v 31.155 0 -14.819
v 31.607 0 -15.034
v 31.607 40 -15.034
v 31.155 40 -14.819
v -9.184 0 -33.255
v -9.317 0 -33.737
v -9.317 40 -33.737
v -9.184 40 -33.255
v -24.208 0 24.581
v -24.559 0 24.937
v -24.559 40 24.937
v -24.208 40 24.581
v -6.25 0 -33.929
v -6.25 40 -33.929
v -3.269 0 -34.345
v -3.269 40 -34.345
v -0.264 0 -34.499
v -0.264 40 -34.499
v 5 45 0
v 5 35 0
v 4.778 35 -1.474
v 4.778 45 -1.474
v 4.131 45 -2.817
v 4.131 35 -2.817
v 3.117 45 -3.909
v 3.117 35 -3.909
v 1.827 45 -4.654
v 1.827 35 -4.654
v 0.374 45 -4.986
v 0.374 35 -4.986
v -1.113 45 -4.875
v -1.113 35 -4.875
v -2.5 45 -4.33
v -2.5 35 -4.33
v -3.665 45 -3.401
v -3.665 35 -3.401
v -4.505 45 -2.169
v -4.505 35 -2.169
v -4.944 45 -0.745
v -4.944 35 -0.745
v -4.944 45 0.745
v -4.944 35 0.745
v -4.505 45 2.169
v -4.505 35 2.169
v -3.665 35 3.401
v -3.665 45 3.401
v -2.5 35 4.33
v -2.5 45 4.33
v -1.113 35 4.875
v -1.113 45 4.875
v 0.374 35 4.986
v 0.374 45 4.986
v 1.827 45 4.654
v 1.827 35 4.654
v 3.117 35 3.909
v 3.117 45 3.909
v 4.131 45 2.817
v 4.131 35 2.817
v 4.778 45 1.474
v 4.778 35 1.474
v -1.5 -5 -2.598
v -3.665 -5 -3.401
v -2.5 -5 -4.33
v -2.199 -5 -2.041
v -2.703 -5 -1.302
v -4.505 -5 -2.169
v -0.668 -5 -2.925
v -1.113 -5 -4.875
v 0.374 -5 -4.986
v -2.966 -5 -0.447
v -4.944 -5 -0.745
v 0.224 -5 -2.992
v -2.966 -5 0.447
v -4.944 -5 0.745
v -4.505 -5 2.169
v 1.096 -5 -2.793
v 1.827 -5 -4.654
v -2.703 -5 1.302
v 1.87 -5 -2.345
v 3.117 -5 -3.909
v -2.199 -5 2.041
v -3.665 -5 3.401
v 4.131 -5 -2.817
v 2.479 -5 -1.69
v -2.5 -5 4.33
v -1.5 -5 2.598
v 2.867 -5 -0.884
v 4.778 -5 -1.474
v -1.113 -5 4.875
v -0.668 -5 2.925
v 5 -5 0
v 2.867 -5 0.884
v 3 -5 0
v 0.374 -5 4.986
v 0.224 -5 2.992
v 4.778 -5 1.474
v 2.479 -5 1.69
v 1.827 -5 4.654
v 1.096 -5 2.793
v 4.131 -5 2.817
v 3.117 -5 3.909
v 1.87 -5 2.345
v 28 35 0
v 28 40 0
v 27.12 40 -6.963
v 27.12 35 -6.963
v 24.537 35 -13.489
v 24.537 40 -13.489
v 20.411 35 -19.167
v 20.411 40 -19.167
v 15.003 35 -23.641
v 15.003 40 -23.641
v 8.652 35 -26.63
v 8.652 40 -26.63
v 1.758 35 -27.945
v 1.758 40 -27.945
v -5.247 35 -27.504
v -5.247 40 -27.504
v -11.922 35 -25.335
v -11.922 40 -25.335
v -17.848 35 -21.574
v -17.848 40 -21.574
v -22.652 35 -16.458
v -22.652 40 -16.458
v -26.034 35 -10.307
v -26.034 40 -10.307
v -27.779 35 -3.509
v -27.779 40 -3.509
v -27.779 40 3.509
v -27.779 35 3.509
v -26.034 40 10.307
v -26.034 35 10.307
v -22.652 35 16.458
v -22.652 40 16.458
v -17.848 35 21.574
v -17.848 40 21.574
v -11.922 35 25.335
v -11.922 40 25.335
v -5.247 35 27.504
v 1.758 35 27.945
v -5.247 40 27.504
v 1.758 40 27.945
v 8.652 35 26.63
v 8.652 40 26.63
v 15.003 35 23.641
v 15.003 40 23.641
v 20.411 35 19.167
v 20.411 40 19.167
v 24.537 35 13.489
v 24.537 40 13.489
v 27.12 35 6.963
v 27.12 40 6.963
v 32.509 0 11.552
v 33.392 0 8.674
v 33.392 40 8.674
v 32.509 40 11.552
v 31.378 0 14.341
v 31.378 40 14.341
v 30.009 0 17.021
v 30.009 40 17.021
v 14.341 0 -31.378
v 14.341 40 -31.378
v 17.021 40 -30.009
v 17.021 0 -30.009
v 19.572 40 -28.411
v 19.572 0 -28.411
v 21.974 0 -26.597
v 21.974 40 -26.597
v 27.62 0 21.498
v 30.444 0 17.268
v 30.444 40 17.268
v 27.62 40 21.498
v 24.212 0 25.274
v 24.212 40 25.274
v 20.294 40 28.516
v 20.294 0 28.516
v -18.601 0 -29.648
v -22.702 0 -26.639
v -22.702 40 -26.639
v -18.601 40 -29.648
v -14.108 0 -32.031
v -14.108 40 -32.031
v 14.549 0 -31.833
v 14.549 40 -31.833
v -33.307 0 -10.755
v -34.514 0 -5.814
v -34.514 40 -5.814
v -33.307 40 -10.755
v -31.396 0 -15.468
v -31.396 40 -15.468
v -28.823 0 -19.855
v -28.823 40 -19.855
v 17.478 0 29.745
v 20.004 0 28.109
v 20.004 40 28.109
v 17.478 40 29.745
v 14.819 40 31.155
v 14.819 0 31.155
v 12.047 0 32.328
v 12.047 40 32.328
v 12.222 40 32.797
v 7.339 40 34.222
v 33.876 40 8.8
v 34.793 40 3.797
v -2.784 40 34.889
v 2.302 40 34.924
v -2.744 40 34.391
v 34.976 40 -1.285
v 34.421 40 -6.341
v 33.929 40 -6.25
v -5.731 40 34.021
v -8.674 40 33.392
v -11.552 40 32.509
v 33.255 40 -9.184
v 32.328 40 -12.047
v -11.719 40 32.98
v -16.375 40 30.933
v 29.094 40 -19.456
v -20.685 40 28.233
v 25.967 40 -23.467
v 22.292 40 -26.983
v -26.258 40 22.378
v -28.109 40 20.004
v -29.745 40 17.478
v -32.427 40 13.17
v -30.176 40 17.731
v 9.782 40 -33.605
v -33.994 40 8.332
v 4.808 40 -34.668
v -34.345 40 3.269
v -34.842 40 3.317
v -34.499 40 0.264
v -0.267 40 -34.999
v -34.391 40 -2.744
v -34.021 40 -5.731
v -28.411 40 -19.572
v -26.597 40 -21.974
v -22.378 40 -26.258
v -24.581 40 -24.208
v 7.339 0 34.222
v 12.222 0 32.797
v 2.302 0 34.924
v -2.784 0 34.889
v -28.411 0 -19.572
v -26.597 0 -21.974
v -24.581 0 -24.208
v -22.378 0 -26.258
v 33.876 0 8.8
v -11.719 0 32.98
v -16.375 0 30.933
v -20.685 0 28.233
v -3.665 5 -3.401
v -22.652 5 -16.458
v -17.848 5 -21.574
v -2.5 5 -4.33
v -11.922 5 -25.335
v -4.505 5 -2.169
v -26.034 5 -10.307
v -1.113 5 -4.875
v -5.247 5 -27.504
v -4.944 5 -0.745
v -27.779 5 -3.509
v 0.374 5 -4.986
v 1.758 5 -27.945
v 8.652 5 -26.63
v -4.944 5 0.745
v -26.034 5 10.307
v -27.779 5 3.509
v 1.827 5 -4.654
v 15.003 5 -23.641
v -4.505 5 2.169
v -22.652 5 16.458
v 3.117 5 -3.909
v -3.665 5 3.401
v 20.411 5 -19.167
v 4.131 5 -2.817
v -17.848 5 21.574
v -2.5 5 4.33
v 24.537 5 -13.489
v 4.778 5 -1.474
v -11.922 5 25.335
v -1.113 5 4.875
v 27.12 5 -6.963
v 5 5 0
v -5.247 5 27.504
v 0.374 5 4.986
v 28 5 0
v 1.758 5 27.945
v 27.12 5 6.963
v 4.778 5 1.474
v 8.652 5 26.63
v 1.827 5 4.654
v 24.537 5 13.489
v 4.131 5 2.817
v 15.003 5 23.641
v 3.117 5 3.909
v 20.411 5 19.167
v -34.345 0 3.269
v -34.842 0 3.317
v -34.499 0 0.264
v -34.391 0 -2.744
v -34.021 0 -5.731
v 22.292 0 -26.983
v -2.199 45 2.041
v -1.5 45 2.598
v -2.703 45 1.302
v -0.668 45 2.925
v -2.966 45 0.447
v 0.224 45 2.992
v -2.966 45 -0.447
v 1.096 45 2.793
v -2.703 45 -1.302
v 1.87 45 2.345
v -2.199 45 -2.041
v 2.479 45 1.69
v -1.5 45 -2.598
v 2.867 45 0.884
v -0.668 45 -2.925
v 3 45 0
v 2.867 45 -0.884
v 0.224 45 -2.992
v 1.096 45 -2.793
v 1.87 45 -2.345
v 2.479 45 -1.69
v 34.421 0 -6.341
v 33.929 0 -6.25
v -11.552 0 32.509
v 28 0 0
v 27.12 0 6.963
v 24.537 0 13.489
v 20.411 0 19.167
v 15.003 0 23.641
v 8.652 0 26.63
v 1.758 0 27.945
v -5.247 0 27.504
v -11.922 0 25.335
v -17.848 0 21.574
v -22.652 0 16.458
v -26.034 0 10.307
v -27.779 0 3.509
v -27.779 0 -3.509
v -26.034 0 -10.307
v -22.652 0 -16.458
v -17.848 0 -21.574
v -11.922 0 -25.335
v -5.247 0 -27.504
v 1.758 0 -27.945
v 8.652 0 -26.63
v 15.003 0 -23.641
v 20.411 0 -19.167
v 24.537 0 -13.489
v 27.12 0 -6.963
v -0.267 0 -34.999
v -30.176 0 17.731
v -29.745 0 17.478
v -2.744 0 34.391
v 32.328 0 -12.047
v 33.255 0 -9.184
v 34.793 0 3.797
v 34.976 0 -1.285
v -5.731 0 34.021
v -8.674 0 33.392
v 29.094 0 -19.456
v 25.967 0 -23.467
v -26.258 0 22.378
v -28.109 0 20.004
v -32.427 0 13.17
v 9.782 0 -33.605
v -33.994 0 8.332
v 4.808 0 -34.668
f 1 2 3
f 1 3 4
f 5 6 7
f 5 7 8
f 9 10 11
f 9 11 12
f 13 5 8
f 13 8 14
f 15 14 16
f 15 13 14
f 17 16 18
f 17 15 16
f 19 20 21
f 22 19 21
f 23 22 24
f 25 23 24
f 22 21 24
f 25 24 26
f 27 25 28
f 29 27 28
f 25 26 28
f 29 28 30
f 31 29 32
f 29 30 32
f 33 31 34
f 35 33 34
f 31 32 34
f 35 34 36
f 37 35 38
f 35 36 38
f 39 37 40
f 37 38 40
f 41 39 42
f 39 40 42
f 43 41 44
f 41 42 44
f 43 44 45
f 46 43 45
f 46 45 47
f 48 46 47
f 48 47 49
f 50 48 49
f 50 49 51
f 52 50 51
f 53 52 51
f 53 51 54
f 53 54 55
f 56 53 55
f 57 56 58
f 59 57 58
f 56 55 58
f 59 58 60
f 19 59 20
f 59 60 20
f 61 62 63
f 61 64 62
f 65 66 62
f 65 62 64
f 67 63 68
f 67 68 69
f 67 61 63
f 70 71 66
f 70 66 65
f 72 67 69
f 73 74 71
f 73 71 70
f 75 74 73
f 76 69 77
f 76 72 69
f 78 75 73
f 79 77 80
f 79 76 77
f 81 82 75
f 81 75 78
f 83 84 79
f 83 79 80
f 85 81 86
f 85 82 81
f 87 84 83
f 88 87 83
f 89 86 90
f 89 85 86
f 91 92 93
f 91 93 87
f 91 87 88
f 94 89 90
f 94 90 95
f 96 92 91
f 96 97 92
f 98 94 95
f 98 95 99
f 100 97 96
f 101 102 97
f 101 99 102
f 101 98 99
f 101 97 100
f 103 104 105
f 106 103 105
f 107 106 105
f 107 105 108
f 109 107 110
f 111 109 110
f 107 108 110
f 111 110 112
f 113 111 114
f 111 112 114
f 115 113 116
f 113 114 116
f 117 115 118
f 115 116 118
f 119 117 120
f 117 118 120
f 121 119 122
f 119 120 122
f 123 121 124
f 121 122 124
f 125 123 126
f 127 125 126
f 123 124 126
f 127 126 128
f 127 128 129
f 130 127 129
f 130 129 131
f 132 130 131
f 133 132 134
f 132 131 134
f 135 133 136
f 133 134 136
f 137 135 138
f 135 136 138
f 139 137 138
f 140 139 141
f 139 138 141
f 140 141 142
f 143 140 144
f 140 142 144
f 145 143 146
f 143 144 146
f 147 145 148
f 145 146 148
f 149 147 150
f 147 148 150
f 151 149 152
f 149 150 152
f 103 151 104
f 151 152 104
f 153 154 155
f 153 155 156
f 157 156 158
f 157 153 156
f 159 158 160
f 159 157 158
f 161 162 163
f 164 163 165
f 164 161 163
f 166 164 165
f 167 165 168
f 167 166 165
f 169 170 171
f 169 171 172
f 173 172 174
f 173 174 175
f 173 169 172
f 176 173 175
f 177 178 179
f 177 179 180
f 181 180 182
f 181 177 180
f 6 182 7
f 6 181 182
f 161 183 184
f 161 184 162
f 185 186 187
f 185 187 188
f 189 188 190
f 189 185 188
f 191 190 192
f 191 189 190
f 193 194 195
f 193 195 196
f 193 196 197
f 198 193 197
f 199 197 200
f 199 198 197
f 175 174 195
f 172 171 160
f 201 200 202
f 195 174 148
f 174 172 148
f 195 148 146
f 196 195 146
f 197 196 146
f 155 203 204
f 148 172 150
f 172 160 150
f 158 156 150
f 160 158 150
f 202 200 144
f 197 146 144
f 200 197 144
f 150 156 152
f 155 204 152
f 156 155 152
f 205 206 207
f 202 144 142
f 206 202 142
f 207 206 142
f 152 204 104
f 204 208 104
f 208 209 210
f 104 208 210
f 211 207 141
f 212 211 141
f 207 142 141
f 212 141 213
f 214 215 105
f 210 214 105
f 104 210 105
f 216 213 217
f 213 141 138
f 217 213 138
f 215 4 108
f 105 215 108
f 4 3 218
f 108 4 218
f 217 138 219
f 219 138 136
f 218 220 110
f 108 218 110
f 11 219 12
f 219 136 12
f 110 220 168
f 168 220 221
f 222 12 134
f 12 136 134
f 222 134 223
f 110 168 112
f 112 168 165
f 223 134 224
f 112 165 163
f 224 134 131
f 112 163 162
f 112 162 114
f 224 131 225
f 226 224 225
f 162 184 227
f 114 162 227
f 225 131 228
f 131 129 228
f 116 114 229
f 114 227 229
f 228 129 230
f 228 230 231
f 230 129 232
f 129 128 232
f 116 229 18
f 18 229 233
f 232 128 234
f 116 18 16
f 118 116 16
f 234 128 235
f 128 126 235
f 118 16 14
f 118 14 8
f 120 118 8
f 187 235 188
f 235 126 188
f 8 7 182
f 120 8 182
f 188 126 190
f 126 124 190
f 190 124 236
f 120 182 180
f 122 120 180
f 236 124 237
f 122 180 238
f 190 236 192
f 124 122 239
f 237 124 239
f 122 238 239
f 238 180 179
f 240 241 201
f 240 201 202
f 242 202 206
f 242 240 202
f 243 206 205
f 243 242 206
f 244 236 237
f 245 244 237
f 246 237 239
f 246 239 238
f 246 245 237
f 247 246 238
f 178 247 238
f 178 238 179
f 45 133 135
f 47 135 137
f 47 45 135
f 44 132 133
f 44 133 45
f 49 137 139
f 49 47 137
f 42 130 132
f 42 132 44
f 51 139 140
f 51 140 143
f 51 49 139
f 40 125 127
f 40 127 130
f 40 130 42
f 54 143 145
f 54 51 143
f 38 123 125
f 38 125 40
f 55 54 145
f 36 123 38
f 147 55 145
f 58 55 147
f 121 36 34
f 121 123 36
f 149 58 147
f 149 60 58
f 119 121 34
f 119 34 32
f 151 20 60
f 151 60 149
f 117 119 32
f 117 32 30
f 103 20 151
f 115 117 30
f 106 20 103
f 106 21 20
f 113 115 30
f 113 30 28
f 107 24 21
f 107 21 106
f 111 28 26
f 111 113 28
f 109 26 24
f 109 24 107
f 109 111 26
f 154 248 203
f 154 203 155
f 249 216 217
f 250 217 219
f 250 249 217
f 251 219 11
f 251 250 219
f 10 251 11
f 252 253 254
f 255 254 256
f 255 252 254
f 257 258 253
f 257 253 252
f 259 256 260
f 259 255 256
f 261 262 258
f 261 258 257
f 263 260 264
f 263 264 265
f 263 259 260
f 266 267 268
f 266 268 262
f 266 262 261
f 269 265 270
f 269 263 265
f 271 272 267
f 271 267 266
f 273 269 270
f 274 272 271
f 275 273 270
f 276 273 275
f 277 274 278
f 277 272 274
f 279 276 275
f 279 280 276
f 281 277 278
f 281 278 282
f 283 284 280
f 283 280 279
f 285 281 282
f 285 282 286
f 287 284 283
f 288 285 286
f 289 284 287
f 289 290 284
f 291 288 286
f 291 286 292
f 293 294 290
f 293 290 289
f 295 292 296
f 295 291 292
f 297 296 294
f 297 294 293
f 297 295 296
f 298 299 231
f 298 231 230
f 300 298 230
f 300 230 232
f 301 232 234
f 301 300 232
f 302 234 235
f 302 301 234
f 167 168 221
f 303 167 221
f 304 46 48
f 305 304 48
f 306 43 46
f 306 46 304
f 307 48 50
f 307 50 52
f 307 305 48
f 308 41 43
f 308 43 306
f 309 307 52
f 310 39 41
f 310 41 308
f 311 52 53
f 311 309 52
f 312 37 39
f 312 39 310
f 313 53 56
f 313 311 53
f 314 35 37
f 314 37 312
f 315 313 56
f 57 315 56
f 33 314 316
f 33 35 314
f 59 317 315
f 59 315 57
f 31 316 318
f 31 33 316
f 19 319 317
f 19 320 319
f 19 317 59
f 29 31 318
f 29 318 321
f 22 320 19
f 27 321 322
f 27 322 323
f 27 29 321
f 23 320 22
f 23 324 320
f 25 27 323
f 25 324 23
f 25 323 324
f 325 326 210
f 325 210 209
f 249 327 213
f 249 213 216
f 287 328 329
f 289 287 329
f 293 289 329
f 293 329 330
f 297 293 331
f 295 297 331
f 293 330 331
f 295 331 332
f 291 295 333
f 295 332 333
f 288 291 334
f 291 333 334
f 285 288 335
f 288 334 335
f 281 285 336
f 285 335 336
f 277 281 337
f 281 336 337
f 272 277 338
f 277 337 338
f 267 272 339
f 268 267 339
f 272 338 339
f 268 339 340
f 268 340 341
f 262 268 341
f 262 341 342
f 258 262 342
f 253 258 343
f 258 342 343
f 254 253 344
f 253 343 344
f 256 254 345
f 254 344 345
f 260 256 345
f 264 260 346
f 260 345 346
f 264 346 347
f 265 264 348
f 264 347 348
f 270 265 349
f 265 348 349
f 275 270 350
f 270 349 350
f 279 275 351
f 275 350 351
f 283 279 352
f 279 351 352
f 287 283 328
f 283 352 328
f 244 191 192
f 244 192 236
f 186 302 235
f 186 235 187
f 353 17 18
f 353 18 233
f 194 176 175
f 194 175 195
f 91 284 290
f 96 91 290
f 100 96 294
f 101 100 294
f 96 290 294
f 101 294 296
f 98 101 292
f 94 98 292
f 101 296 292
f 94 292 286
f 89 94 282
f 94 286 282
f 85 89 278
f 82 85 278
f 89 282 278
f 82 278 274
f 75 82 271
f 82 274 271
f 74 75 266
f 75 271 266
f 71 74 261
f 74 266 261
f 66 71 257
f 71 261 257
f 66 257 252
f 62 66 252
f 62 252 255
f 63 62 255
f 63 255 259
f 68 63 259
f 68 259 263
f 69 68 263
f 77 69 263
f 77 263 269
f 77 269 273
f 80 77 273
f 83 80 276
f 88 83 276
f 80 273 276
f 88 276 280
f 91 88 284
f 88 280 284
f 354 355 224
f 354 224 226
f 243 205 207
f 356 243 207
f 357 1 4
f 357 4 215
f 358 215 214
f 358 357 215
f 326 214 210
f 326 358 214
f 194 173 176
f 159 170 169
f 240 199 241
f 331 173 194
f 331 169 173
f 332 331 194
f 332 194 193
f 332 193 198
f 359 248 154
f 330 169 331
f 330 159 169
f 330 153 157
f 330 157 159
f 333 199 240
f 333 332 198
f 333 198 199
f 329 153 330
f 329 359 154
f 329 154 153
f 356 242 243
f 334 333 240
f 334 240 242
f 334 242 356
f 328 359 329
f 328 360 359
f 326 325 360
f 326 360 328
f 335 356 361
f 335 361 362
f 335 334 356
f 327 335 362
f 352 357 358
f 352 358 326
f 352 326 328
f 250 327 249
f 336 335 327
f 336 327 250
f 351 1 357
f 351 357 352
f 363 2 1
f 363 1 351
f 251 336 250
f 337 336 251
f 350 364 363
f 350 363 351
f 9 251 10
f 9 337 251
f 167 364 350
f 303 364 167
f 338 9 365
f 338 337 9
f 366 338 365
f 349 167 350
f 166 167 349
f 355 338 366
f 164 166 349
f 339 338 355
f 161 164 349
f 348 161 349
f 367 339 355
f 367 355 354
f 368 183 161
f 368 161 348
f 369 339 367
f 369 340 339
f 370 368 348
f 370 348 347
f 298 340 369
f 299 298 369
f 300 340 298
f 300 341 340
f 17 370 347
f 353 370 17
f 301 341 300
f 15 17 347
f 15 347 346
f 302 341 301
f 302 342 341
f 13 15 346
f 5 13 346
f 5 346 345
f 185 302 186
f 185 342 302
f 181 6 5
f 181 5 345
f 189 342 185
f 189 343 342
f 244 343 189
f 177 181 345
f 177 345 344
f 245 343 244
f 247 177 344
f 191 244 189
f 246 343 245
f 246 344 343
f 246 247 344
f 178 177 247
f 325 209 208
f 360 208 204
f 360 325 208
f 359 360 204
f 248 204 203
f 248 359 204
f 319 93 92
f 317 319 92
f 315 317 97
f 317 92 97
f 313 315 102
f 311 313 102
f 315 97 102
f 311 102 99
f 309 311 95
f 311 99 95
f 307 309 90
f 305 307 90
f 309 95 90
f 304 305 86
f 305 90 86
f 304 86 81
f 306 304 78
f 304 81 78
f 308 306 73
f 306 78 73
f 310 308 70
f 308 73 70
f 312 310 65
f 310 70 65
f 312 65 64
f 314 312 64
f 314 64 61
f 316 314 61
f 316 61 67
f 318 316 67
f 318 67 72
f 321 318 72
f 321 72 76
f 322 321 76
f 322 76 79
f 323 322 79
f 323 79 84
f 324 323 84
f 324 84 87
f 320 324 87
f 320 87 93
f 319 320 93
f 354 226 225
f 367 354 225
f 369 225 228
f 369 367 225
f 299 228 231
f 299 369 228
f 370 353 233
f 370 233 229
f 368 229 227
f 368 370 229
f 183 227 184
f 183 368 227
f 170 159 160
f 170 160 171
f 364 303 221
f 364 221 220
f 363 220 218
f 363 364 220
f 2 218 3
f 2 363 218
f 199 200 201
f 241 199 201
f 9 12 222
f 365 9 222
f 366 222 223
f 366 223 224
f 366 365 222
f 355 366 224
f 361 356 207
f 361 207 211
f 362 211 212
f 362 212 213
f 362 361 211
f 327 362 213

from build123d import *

# Parameters (mm, degrees)
BOSS_EXTRUDE1_DEPTH = 40
SKETCH2_R           = 28
CUT_EXTRUDE1_DEPTH  = 5
SKETCH3_R           = 28
CUT_EXTRUDE2_DEPTH  = 5
SKETCH4_R           = 5
BOSS_EXTRUDE2_DEPTH = 10
SKETCH5_R           = 5
BOSS_EXTRUDE3_DEPTH = 10
SKETCH6_R           = 3
CUT_EXTRUDE3_DEPTH  = 51


with BuildPart() as part:
    # Sketch1 → Boss-Extrude1 (new body)
    with BuildSketch(Plane(origin=(0, 0, 0), x_dir=(1, 0, 0), z_dir=(0, 1, 0))):
        with BuildLine():
            Line((-9.316786783, 33.737182515), (-9.183689829, 33.255222765))
            ThreePointArc((-9.183689829, 33.255222765), (-4.764444491, 34.169431788), (-0.263678186, 34.498992359))
            Line((-0.263678186, 34.498992359), (-0.267499609, 34.998977756))
            ThreePointArc((-0.267499609, 34.998977756), (7.314006433, 34.227259749), (14.548770163, 31.832896298))
            Line((14.548770163, 31.832896298), (14.340930589, 31.378140637))
            ThreePointArc((14.340930589, 31.378140637), (18.313911156, 29.237829231), (21.973535626, 26.597250461))
            Line((21.973535626, 26.597250461), (22.291992664, 26.982717859))
            ThreePointArc((22.291992664, 26.982717859), (27.603712465, 21.518249421), (31.606795859, 15.033644121))
            Line((31.606795859, 15.033644121), (31.155270204, 14.818877776))
            ThreePointArc((31.155270204, 14.818877776), (32.822984237, 10.625521435), (33.92908791, 6.250359477))
            Line((33.92908791, 6.250359477), (34.420813822, 6.340944397))
            ThreePointArc((34.420813822, 6.340944397), (34.977334653, -1.259388959), (33.875650502, -8.800017221))
            Line((33.875650502, -8.800017221), (33.391712637, -8.67430269))
            ThreePointArc((33.391712637, -8.67430269), (31.973818206, -12.95858593), (30.008842881, -17.021144172))
            Line((30.008842881, -17.021144172), (30.443753648, -17.267827421))
            ThreePointArc((30.443753648, -17.267827421), (25.984673227, -23.447745249), (20.293711789, -28.516052704))
            Line((20.293711789, -28.516052704), (20.00380162, -28.108680523))
            ThreePointArc((20.00380162, -28.108680523), (16.163747288, -30.47922692), (12.047126757, -32.328265294))
            Line((12.047126757, -32.328265294), (12.221722797, -32.796790878))
            ThreePointArc((12.221722797, -32.796790878), (4.833494411, -34.664640944), (-2.783880209, -34.889110206))
            Line((-2.783880209, -34.889110206), (-2.744110492, -34.390694346))
            ThreePointArc((-2.744110492, -34.390694346), (-7.209520627, -33.738298895), (-11.551573865, -32.508631796))
            Line((-11.551573865, -32.508631796), (-11.718987979, -32.979771387))
            ThreePointArc((-11.718987979, -32.979771387), (-18.579330159, -29.661565887), (-24.558863718, -24.937165293))
            Line((-24.558863718, -24.937165293), (-24.208022808, -24.580920075))
            ThreePointArc((-24.208022808, -24.580920075), (-27.209373716, -21.210845858), (-29.745164695, -17.477848187))
            Line((-29.745164695, -17.477848187), (-30.176254039, -17.731150335))
            ThreePointArc((-30.176254039, -17.731150335), (-33.298679661, -10.7795145), (-34.842481952, -3.316843594))
            Line((-34.842481952, -3.316843594), (-34.34473221, -3.269460114))
            ThreePointArc((-34.34473221, -3.269460114), (-34.477658444, 1.241397688), (-34.020662383, 5.731014832))
            Line((-34.020662383, 5.731014832), (-34.513715461, 5.814073018))
            ThreePointArc((-34.513715461, 5.814073018), (-32.437206876, 13.146391523), (-28.822915649, 19.855466085))
            Line((-28.822915649, 19.855466085), (-28.411159712, 19.57181657))
            ThreePointArc((-28.411159712, 19.57181657), (-25.61346361, 23.11277746), (-22.377514045, 26.258272319))
            Line((-22.377514045, 26.258272319), (-22.701825842, 26.63882699))
            ThreePointArc((-22.701825842, 26.63882699), (-16.398004495, 30.920954846), (-9.316786783, 33.737182515))
        make_face()
    extrude(amount=BOSS_EXTRUDE1_DEPTH)

    # Sketch2 → Cut-Extrude1 (cut)
    with BuildSketch(Plane(origin=(0, 40, 0), x_dir=(1, 0, 0), z_dir=(0, 1, 0))):
        Circle(SKETCH2_R)
    extrude(amount=-CUT_EXTRUDE1_DEPTH, mode=Mode.SUBTRACT)

    # Sketch3 → Cut-Extrude2 (cut)
    with BuildSketch(Plane.XZ):
        Circle(SKETCH3_R)
    extrude(amount=-CUT_EXTRUDE2_DEPTH, mode=Mode.SUBTRACT)

    # Sketch4 → Boss-Extrude2 (add)
    with BuildSketch(Plane(origin=(0, 35, 0), x_dir=(1, 0, 0), z_dir=(0, 1, 0))):
        Circle(SKETCH4_R)
    extrude(amount=BOSS_EXTRUDE2_DEPTH)

    # Sketch5 → Boss-Extrude3 (add)
    with BuildSketch(Plane.XZ.offset(-5)):
        Circle(SKETCH5_R)
    extrude(amount=BOSS_EXTRUDE3_DEPTH)

    # Sketch6 → Cut-Extrude3 (cut, through all)
    with BuildSketch(Plane.XZ.offset(5)):
        Circle(SKETCH6_R)
    extrude(amount=-CUT_EXTRUDE3_DEPTH, mode=Mode.SUBTRACT)


solid = part.part
